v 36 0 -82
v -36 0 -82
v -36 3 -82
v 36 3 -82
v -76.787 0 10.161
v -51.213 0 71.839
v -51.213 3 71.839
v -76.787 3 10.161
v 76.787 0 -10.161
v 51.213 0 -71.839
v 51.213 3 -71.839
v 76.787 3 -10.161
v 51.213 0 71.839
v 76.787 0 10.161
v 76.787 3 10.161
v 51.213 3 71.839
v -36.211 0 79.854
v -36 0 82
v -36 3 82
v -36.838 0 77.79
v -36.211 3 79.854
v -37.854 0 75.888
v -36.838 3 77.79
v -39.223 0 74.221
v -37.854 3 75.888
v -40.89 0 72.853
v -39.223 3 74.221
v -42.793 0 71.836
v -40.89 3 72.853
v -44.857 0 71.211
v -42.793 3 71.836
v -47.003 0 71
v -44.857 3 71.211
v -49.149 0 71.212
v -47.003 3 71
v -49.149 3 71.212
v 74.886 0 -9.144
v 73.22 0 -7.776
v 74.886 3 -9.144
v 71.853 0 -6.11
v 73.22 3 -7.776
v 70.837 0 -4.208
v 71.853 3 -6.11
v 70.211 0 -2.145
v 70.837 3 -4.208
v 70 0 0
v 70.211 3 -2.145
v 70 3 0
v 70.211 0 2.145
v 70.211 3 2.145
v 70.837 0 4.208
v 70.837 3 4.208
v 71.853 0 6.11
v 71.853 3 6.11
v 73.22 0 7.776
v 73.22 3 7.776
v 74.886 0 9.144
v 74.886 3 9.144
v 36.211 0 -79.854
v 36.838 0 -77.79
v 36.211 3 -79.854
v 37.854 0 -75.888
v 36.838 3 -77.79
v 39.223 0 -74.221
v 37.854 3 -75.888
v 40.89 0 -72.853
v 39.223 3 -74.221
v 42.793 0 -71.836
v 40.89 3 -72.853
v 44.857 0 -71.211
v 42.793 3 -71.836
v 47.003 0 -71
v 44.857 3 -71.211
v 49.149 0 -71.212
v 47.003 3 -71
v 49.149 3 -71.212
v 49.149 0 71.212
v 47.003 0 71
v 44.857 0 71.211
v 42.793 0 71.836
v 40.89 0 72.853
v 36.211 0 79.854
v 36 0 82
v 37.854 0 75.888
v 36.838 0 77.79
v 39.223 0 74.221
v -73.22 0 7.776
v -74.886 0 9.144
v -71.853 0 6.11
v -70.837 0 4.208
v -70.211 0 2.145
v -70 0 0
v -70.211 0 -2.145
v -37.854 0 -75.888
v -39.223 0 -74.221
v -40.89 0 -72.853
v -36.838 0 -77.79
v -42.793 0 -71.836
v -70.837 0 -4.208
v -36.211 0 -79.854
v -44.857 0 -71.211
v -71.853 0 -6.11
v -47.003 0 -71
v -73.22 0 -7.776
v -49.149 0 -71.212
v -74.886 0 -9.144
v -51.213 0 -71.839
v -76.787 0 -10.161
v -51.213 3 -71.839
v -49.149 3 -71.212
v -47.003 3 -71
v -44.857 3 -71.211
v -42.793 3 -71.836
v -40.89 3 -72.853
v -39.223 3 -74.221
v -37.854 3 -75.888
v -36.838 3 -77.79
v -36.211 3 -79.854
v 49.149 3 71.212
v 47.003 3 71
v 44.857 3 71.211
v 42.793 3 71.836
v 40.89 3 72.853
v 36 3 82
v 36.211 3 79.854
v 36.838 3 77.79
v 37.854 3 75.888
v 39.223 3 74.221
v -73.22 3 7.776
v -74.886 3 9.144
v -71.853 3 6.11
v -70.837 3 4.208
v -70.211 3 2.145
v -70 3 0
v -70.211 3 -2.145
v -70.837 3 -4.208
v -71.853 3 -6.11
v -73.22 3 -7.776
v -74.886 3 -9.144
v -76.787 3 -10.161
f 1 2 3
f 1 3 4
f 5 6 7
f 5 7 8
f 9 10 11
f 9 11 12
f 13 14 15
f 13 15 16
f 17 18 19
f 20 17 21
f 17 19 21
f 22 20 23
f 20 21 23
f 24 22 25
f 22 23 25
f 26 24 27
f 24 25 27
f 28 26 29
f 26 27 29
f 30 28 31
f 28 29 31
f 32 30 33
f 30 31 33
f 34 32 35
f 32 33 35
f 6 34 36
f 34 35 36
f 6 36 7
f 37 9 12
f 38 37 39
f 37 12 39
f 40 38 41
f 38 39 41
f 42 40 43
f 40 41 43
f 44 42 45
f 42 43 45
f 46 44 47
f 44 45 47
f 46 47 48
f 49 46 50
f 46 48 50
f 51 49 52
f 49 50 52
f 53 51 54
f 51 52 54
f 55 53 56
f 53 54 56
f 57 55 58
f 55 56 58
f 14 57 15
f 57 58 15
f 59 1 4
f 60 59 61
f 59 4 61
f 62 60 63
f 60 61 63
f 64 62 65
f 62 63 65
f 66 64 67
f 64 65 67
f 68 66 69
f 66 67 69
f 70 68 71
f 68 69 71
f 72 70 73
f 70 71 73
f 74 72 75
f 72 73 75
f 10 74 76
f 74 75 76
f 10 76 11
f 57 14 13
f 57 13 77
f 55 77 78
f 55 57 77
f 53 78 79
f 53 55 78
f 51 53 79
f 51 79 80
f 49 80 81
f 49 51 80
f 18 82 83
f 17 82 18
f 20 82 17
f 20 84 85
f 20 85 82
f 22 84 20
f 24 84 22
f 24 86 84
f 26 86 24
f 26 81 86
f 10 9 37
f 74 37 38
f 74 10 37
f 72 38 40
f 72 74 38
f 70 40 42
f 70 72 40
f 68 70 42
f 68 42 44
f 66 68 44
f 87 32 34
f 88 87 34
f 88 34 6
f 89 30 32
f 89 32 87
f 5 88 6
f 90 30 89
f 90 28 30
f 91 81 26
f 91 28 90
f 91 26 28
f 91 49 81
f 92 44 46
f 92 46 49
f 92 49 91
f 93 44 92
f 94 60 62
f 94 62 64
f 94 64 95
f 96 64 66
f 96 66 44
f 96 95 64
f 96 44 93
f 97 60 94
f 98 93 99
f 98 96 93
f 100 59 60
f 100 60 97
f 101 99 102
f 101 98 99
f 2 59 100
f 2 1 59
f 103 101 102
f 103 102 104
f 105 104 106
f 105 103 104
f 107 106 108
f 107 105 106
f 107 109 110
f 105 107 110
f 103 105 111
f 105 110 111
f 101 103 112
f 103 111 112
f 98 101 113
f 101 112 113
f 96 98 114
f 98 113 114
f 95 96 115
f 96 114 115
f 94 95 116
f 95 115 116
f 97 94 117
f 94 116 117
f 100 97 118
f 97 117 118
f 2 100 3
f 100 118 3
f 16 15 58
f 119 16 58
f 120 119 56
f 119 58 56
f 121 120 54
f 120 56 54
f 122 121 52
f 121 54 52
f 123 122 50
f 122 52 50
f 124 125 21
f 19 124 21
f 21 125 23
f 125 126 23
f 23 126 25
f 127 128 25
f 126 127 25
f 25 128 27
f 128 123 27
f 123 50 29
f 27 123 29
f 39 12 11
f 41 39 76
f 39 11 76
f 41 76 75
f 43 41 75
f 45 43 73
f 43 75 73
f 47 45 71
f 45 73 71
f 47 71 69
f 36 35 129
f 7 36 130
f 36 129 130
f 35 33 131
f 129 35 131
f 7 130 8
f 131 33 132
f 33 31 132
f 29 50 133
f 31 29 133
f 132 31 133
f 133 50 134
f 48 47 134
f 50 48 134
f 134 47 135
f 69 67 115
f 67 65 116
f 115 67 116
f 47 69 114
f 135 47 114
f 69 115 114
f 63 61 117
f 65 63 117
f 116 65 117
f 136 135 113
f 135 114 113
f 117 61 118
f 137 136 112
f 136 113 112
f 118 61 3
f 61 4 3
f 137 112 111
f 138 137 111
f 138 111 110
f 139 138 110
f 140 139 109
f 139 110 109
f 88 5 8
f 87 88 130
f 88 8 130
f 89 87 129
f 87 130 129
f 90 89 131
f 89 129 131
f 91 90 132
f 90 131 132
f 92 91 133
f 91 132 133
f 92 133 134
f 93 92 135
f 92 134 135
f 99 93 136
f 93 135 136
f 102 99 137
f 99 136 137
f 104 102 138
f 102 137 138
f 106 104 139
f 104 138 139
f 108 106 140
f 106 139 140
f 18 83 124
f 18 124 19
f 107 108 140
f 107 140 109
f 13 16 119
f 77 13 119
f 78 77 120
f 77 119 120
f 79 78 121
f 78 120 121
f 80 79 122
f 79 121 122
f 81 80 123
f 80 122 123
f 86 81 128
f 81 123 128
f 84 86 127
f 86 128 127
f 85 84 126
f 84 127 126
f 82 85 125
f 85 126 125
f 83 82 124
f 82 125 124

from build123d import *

# Parameters (mm, degrees)
EXTRUDE_1_DEPTH     = 3
SKETCH_5_R          = 11
CUT_EXTRUDE_2_DEPTH = 116.299609713


with BuildPart() as part:
    # 草图4 → 凸台-拉伸1 (new body)
    with BuildSketch(Plane(origin=(0, 0, 0), x_dir=(1, 0, 0), z_dir=(0, 1, 0))):
        Polygon((-47, 82), (47, 82), (81, 0), (47, -82), (-47, -82), (-81, 0), align=None)
    extrude(amount=EXTRUDE_1_DEPTH)

    # 草图5 → 切除-拉伸2 (cut, through all)
    with BuildSketch(Plane(origin=(0, 3, 0), x_dir=(1, 0, 0), z_dir=(0, 1, 0))):
        with Locations((-81, 0)):
            Circle(SKETCH_5_R)
        with Locations((81, 0)):
            Circle(SKETCH_5_R)
        with Locations((47, -82)):
            Circle(SKETCH_5_R)
        with Locations((-47, -82)):
            Circle(SKETCH_5_R)
        with Locations((-47, 82)):
            Circle(SKETCH_5_R)
        with Locations((47, 82)):
            Circle(SKETCH_5_R)
    extrude(amount=-CUT_EXTRUDE_2_DEPTH, mode=Mode.SUBTRACT)


solid = part.part
